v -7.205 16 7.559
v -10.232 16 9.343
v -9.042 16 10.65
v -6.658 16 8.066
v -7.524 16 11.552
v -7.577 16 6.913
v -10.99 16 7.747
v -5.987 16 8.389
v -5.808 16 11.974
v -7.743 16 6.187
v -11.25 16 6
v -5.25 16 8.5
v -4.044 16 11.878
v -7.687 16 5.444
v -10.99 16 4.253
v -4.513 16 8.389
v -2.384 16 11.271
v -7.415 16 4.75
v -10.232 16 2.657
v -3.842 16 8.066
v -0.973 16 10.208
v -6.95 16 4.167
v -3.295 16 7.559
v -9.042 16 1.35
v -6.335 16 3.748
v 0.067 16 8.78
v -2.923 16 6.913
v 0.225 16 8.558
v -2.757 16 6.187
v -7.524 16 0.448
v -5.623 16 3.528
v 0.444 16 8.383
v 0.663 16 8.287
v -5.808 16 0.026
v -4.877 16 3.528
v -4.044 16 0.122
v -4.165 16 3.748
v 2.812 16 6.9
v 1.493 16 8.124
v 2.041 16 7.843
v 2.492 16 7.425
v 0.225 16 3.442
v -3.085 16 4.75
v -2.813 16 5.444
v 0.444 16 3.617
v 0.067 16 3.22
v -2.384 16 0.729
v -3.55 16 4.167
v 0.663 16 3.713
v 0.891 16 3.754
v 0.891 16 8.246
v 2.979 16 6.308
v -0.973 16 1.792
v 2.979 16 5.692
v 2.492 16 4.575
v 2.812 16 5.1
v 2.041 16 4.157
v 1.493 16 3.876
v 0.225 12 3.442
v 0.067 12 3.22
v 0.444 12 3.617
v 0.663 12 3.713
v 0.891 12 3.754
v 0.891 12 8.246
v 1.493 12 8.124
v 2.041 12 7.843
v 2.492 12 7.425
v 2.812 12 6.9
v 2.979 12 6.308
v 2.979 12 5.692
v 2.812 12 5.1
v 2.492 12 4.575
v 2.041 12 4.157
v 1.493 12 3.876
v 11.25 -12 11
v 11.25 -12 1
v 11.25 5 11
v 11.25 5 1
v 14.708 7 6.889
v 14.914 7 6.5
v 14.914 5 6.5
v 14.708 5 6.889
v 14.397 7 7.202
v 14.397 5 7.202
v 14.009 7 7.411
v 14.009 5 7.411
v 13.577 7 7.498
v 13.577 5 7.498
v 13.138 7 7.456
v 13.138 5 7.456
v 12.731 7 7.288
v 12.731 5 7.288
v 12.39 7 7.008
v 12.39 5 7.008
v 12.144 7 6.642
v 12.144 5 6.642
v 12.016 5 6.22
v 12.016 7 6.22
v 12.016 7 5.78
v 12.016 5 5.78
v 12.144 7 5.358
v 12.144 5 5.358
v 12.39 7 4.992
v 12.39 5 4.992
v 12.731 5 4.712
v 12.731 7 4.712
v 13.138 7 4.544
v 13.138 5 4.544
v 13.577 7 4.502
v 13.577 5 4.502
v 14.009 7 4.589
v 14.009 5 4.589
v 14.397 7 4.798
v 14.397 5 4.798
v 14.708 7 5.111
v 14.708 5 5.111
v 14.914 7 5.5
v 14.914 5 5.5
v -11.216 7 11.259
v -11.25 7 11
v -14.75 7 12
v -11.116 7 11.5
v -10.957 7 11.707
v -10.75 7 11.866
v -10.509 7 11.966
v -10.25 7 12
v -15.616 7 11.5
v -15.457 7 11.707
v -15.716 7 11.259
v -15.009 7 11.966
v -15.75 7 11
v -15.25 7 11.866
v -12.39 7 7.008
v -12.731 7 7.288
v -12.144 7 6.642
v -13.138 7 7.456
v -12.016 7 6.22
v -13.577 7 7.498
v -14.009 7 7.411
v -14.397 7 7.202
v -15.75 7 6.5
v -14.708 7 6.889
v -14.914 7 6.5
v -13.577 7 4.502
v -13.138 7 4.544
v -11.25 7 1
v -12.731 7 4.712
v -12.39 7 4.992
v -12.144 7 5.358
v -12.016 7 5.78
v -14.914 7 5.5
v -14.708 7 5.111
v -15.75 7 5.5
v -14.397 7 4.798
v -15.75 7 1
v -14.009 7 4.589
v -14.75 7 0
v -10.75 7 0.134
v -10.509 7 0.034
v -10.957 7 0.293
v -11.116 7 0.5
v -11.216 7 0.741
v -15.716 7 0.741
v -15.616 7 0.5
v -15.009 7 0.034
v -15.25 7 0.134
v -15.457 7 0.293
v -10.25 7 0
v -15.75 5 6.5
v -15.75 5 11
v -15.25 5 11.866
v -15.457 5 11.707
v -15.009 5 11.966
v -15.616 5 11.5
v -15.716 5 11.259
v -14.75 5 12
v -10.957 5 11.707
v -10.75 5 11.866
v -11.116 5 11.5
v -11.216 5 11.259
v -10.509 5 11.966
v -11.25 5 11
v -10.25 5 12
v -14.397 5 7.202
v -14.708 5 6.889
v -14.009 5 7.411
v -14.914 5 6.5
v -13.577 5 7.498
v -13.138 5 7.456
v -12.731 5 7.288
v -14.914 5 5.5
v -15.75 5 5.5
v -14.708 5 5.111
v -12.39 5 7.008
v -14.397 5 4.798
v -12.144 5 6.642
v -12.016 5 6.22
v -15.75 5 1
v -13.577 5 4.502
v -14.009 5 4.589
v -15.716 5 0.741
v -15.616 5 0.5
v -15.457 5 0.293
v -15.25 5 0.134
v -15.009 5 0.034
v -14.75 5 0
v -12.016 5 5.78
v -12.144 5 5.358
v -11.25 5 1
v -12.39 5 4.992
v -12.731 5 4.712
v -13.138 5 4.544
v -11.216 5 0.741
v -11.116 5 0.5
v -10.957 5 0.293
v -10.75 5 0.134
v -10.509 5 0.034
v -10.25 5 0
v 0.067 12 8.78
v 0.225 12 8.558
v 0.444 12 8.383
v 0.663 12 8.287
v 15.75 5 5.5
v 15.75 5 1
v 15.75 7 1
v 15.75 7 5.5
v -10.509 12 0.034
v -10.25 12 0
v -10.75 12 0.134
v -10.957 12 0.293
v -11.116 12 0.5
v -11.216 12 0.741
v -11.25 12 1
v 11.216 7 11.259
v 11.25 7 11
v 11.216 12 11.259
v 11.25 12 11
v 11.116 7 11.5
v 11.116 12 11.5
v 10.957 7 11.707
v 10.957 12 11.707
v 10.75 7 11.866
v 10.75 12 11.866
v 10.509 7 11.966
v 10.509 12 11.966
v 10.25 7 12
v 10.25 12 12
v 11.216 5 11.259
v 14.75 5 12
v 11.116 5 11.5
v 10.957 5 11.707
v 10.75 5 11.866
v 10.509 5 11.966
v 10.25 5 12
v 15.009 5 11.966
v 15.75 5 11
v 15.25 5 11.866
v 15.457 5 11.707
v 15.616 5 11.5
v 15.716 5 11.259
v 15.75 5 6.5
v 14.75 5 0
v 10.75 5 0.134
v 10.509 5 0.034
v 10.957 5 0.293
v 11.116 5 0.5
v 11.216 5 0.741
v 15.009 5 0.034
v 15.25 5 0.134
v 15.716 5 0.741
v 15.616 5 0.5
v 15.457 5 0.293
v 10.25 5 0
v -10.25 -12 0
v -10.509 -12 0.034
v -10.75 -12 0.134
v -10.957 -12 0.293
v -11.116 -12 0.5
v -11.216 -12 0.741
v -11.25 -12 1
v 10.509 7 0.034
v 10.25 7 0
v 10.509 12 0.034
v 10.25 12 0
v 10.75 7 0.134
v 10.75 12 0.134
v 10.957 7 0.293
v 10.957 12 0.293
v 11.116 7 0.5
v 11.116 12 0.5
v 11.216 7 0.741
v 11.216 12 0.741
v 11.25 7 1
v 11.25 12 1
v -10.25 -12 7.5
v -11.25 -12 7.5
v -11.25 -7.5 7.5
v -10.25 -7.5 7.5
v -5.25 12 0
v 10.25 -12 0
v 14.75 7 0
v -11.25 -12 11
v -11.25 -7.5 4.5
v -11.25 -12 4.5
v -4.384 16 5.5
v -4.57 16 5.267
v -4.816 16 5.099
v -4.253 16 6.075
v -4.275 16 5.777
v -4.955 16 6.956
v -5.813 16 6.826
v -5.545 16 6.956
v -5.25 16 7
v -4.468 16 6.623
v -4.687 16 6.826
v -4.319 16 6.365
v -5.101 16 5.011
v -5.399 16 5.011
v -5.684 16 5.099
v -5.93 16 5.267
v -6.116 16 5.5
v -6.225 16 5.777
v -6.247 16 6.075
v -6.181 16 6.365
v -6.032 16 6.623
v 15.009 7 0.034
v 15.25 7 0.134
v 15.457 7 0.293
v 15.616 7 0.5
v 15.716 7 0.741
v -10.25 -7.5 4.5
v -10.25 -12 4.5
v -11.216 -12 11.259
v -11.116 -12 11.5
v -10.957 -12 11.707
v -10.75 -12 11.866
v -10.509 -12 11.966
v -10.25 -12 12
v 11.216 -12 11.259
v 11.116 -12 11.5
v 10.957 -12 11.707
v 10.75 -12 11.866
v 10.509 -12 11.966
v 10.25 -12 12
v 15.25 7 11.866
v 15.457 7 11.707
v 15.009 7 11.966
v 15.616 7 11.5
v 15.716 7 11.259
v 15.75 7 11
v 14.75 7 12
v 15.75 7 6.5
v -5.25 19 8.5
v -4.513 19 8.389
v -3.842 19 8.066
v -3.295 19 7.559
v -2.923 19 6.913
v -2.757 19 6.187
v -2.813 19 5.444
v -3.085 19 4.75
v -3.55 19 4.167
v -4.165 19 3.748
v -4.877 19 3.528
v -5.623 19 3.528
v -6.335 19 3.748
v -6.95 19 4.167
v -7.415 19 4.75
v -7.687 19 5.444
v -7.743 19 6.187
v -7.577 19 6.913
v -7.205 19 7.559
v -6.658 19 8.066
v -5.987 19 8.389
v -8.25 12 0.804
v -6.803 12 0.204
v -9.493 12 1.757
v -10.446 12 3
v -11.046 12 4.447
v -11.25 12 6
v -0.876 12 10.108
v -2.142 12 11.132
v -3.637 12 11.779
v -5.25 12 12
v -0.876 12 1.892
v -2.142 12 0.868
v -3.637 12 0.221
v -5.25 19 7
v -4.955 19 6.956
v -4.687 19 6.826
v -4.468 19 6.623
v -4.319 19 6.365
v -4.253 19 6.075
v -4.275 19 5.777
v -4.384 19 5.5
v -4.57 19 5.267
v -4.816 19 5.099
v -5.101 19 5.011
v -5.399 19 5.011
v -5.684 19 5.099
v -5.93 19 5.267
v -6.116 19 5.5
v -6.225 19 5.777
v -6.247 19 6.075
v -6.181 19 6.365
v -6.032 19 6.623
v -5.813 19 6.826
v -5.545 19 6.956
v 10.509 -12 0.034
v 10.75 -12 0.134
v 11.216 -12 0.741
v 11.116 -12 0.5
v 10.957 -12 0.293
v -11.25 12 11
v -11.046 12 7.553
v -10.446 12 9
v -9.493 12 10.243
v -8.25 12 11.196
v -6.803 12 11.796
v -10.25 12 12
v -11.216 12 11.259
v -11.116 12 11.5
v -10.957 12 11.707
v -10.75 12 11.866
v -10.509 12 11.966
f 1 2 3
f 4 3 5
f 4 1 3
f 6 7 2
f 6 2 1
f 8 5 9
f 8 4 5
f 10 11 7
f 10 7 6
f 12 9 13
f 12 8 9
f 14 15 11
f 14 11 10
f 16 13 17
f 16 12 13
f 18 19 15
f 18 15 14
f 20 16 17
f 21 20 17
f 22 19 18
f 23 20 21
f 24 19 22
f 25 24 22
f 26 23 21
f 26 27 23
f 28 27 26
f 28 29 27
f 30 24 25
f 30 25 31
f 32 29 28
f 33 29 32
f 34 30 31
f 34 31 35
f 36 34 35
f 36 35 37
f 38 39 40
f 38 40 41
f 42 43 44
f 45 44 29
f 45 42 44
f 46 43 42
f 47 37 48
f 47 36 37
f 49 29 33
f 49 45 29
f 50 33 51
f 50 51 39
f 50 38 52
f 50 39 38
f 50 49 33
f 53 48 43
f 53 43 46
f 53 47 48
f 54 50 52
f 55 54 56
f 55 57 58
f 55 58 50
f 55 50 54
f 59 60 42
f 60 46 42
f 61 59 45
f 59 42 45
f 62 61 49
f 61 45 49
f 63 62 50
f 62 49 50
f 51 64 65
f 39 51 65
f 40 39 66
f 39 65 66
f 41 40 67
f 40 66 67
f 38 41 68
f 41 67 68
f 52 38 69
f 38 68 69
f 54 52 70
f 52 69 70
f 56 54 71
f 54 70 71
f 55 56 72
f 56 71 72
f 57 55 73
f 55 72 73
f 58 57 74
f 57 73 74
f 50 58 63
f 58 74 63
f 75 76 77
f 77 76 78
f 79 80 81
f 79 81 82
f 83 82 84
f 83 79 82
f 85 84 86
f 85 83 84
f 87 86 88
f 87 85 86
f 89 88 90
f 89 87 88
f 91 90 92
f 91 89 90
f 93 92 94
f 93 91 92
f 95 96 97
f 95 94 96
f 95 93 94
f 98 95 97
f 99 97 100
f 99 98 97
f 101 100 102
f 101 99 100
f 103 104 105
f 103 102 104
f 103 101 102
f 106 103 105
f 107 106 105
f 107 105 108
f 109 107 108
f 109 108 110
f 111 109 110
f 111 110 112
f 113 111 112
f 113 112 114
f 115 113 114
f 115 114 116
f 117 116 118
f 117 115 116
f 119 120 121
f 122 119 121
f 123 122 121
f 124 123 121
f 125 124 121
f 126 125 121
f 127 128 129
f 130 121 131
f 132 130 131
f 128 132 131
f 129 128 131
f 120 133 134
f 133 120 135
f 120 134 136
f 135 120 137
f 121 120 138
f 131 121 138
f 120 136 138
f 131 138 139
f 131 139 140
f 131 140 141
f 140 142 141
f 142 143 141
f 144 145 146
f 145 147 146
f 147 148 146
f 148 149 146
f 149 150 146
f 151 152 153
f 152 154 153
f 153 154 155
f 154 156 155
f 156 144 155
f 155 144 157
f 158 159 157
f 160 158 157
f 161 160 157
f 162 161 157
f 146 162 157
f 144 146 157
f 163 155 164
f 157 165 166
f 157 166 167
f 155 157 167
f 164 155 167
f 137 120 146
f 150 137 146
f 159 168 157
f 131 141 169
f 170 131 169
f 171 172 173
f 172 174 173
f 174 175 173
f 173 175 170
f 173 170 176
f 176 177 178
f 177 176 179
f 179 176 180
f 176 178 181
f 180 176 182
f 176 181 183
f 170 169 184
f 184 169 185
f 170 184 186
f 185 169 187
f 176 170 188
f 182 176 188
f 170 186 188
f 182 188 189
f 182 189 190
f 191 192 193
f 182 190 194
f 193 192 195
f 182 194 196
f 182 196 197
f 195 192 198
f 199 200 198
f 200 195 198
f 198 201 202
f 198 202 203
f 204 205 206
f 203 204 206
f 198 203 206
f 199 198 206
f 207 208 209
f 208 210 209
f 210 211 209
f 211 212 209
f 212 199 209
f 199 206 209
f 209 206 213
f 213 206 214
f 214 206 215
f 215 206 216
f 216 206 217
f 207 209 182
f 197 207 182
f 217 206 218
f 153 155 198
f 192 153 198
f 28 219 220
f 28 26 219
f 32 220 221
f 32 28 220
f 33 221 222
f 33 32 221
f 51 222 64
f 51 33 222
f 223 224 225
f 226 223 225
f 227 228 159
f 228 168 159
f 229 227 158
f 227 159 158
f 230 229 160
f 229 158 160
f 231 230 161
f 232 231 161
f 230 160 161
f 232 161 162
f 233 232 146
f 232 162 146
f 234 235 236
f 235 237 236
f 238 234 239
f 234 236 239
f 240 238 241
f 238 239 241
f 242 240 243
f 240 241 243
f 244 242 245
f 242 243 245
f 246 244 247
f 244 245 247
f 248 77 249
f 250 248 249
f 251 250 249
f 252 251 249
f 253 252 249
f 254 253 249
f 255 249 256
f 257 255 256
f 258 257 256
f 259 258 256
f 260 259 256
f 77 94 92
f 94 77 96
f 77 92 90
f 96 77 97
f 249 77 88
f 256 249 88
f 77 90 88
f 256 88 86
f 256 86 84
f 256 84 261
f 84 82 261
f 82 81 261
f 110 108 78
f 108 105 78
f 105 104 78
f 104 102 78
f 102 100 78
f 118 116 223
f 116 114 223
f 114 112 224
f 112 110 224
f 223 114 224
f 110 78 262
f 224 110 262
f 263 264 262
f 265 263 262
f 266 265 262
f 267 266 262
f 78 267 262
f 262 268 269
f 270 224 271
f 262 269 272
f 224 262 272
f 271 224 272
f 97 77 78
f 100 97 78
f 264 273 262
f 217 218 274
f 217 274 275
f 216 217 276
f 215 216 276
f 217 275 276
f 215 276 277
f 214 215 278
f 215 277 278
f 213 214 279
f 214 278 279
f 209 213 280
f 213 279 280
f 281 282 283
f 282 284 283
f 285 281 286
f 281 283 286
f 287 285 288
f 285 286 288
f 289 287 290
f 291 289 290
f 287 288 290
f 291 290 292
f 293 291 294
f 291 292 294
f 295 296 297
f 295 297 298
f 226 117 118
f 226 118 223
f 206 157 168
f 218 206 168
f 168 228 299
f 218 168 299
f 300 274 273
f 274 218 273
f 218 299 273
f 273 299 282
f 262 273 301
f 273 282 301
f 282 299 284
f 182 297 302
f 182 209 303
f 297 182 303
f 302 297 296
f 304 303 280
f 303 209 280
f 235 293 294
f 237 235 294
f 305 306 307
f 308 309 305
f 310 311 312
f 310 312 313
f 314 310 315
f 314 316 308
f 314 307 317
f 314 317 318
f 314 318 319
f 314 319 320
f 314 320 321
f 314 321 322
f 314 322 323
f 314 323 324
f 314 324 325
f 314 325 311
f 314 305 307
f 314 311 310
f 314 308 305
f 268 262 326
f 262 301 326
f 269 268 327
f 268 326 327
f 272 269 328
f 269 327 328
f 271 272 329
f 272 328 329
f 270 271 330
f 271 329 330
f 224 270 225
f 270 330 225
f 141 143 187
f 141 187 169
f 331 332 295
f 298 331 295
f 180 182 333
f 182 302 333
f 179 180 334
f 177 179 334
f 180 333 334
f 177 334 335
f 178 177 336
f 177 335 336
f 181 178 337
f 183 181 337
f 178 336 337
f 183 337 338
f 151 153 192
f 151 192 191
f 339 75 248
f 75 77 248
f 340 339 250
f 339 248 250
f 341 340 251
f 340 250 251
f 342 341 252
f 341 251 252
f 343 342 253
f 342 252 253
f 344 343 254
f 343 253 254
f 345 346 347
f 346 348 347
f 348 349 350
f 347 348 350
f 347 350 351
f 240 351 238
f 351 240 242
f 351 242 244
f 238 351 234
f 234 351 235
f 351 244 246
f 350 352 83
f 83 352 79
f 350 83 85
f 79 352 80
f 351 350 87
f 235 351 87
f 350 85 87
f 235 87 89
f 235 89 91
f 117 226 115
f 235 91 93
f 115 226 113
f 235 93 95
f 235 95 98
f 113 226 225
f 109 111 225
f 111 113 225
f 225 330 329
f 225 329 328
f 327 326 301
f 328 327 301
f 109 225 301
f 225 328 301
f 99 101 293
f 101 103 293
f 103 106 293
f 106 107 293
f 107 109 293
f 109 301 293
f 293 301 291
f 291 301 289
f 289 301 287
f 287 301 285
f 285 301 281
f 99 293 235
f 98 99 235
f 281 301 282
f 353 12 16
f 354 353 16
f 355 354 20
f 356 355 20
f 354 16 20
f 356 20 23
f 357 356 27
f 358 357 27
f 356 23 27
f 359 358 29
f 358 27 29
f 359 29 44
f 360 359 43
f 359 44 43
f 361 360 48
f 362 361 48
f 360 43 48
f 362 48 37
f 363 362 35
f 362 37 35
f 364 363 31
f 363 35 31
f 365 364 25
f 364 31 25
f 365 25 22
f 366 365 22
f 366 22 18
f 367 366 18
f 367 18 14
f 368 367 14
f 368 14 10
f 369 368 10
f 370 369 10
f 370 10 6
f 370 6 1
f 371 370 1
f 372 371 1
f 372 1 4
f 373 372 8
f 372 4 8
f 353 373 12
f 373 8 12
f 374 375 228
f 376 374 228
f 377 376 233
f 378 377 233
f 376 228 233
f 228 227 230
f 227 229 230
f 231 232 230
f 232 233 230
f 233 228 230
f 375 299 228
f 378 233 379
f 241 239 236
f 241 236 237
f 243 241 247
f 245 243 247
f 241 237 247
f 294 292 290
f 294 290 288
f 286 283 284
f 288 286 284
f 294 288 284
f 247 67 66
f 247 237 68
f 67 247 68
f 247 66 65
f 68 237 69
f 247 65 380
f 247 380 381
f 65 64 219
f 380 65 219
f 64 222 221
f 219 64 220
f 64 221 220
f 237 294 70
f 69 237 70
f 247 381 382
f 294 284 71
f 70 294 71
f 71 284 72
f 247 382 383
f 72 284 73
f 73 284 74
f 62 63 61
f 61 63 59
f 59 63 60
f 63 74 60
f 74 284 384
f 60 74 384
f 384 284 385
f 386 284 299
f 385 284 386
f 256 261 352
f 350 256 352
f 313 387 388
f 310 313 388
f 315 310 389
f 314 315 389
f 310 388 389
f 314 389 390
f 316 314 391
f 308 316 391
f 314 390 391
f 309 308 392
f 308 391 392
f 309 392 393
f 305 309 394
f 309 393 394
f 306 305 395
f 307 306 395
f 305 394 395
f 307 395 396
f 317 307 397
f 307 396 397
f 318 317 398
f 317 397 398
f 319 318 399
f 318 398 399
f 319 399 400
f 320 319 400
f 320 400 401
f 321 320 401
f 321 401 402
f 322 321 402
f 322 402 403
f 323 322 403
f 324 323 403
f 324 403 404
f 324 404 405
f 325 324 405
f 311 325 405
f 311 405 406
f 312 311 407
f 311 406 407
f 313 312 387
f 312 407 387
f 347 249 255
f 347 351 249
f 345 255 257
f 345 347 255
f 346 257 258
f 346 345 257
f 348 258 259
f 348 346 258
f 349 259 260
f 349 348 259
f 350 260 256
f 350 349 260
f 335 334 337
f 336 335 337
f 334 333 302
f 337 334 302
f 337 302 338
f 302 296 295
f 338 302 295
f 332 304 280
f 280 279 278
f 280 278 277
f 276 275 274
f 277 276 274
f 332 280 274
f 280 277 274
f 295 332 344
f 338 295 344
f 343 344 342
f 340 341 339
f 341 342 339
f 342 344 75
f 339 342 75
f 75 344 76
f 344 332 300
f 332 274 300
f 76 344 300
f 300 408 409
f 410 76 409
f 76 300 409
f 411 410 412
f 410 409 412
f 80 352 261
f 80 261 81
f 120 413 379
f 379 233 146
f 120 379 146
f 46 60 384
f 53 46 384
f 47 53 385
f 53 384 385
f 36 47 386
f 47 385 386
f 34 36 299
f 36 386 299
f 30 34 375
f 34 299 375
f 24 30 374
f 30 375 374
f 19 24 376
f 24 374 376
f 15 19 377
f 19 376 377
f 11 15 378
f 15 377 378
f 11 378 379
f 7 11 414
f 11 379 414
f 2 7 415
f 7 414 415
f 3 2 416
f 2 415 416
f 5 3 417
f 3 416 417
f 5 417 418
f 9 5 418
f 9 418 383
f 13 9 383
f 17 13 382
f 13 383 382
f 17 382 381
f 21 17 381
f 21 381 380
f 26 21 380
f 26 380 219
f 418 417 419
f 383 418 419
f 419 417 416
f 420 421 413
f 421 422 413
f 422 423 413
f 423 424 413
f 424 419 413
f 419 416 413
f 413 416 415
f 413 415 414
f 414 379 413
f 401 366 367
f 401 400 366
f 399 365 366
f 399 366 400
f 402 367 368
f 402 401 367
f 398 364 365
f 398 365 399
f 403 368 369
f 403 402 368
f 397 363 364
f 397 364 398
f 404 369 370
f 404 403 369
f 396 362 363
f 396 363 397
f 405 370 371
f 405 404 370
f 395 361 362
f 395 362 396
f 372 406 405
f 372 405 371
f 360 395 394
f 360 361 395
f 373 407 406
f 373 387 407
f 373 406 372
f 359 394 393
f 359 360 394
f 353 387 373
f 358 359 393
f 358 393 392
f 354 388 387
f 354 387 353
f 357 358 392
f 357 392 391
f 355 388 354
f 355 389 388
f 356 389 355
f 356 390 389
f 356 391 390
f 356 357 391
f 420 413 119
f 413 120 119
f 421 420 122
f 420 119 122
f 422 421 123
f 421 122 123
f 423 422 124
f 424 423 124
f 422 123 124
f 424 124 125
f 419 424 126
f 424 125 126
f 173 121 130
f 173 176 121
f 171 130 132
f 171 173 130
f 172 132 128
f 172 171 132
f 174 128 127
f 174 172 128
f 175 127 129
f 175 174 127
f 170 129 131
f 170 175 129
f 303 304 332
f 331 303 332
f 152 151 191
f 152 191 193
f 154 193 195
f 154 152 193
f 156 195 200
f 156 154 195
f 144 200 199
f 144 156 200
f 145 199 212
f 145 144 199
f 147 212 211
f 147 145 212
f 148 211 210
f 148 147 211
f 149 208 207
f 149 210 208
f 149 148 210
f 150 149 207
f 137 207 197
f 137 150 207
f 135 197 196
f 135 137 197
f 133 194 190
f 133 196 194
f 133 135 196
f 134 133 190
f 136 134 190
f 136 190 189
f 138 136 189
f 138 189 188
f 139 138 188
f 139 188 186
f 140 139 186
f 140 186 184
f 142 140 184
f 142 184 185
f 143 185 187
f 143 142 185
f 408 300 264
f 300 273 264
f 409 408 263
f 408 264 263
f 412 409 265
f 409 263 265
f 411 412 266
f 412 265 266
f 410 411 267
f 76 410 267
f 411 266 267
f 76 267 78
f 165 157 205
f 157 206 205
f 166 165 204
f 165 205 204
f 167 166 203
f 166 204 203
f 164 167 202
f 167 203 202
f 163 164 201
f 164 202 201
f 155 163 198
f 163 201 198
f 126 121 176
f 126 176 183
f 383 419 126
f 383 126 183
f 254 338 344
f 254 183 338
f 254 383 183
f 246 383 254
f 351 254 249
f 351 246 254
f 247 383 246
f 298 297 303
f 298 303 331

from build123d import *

# Parameters (mm, degrees)
EXTRUDE_1_DEPTH     = 12
EXTRUDE_2_DEPTH     = 4
CUT_EXTRUDE_1_DEPTH = 28.441984258
SKETCH_4_R          = 2.5
EXTRUDE_3_DEPTH     = 3
FILLET_1_R          = 1
FILLET_2_R          = 1
FILLET_3_R          = 1
SKETCH_5_R          = 1
CUT_EXTRUDE_2_DEPTH = 3
SKETCH_6_W          = 1
SKETCH_6_H          = 3
CUT_EXTRUDE_3_DEPTH = 4.5


with BuildPart() as part:
    # 草图1 → 凸台-拉伸1 (new body)
    with BuildSketch(Plane.XY):
        Polygon((-11.25, -12), (11.25, -12), (11.25, 5), (15.75, 5), (15.75, 7), (11.25, 7), (11.25, 12), (-11.25, 12), (-11.25, 7), (-15.75, 7), (-15.75, 5), (-11.25, 5), align=None)
    extrude(amount=EXTRUDE_1_DEPTH)

    # 草图2 → 凸台-拉伸2 (add)
    with BuildSketch(Plane(origin=(0, 12, 0), x_dir=(1, 0, 0), z_dir=(0, 1, 0))):
        with BuildLine():
            ThreePointArc((0.328125, -3.789904644), (-11.25, -6), (0.328125, -8.210095356))
            ThreePointArc((0.328125, -8.210095356), (3, -6), (0.328125, -3.789904644))
        make_face()
    extrude(amount=EXTRUDE_2_DEPTH)

    # 草图3 → 切除-拉伸1 (cut, through all)
    with BuildSketch(Plane(origin=(0, 7, 0), x_dir=(1, 0, 0), z_dir=(0, 1, 0))):
        with BuildLine():
            Line((15.75, -6.5), (14.914213562, -6.5))
            ThreePointArc((14.914213562, -6.5), (12, -6), (14.914213562, -5.5))
            Line((14.914213562, -5.5), (15.75, -5.5))
            Line((15.75, -5.5), (15.75, -6.5))
        make_face()
        with BuildLine():
            Line((-15.75, -5.5), (-14.914213562, -5.5))
            ThreePointArc((-14.914213562, -5.5), (-12, -6), (-14.914213562, -6.5))
            Line((-14.914213562, -6.5), (-15.75, -6.5))
            Line((-15.75, -6.5), (-15.75, -5.5))
        make_face()
    extrude(amount=-CUT_EXTRUDE_1_DEPTH, mode=Mode.SUBTRACT)

    # 草图4 → 凸台-拉伸3 (add)
    with BuildSketch(Plane(origin=(0, 16, 0), x_dir=(1, 0, 0), z_dir=(0, 1, 0))):
        with Locations(Location((-5.25, -6, 0), (0, 0, 270))):
            Circle(SKETCH_4_R)
    extrude(amount=EXTRUDE_3_DEPTH)

    # 圆角1
    fillet_1_edges = [part.edges().sort_by_distance(p)[0] for p in [
        (15.75, 6, 0),
        (-15.75, 6, 0),
        (-15.75, 6, 12),
        (15.75, 6, 12),
    ]]
    fillet(fillet_1_edges, radius=FILLET_1_R)

    # 圆角2
    fillet_2_edges = [part.edges().sort_by_distance(p)[0] for p in [
        (-11.25, 9.5, 12),
        (11.25, -3.5, 0),
        (-11.25, -3.5, 0),
        (-11.25, 9.5, 0),
        (11.25, 9.5, 0),
        (-11.25, -3.5, 12),
        (11.25, -3.5, 12),
        (11.25, 9.5, 12),
    ]]
    fillet(fillet_2_edges, radius=FILLET_2_R)

    # 圆角3
    fillet_3_edges = [part.edges().sort_by_distance(p)[0] for p in [
        (0.328125, 14, 8.210095356),
        (0.328125, 14, 3.789904644),
    ]]
    fillet(fillet_3_edges, radius=FILLET_3_R)

    # 草图5 → 切除-拉伸2 (cut)
    with BuildSketch(Plane(origin=(0, 19, 0), x_dir=(1, 0, 0), z_dir=(0, 1, 0))):
        with Locations(Location((-5.25, -6, 0), (0, 0, 270))):
            Circle(SKETCH_5_R)
    extrude(amount=-CUT_EXTRUDE_2_DEPTH, mode=Mode.SUBTRACT)

    # 草图6 → 切除-拉伸3 (cut)
    with BuildSketch(Plane.XZ.offset(12)):
        with Locations((-10.75, 6)):
            Rectangle(SKETCH_6_W, SKETCH_6_H)
    extrude(amount=-CUT_EXTRUDE_3_DEPTH, mode=Mode.SUBTRACT)


solid = part.part
